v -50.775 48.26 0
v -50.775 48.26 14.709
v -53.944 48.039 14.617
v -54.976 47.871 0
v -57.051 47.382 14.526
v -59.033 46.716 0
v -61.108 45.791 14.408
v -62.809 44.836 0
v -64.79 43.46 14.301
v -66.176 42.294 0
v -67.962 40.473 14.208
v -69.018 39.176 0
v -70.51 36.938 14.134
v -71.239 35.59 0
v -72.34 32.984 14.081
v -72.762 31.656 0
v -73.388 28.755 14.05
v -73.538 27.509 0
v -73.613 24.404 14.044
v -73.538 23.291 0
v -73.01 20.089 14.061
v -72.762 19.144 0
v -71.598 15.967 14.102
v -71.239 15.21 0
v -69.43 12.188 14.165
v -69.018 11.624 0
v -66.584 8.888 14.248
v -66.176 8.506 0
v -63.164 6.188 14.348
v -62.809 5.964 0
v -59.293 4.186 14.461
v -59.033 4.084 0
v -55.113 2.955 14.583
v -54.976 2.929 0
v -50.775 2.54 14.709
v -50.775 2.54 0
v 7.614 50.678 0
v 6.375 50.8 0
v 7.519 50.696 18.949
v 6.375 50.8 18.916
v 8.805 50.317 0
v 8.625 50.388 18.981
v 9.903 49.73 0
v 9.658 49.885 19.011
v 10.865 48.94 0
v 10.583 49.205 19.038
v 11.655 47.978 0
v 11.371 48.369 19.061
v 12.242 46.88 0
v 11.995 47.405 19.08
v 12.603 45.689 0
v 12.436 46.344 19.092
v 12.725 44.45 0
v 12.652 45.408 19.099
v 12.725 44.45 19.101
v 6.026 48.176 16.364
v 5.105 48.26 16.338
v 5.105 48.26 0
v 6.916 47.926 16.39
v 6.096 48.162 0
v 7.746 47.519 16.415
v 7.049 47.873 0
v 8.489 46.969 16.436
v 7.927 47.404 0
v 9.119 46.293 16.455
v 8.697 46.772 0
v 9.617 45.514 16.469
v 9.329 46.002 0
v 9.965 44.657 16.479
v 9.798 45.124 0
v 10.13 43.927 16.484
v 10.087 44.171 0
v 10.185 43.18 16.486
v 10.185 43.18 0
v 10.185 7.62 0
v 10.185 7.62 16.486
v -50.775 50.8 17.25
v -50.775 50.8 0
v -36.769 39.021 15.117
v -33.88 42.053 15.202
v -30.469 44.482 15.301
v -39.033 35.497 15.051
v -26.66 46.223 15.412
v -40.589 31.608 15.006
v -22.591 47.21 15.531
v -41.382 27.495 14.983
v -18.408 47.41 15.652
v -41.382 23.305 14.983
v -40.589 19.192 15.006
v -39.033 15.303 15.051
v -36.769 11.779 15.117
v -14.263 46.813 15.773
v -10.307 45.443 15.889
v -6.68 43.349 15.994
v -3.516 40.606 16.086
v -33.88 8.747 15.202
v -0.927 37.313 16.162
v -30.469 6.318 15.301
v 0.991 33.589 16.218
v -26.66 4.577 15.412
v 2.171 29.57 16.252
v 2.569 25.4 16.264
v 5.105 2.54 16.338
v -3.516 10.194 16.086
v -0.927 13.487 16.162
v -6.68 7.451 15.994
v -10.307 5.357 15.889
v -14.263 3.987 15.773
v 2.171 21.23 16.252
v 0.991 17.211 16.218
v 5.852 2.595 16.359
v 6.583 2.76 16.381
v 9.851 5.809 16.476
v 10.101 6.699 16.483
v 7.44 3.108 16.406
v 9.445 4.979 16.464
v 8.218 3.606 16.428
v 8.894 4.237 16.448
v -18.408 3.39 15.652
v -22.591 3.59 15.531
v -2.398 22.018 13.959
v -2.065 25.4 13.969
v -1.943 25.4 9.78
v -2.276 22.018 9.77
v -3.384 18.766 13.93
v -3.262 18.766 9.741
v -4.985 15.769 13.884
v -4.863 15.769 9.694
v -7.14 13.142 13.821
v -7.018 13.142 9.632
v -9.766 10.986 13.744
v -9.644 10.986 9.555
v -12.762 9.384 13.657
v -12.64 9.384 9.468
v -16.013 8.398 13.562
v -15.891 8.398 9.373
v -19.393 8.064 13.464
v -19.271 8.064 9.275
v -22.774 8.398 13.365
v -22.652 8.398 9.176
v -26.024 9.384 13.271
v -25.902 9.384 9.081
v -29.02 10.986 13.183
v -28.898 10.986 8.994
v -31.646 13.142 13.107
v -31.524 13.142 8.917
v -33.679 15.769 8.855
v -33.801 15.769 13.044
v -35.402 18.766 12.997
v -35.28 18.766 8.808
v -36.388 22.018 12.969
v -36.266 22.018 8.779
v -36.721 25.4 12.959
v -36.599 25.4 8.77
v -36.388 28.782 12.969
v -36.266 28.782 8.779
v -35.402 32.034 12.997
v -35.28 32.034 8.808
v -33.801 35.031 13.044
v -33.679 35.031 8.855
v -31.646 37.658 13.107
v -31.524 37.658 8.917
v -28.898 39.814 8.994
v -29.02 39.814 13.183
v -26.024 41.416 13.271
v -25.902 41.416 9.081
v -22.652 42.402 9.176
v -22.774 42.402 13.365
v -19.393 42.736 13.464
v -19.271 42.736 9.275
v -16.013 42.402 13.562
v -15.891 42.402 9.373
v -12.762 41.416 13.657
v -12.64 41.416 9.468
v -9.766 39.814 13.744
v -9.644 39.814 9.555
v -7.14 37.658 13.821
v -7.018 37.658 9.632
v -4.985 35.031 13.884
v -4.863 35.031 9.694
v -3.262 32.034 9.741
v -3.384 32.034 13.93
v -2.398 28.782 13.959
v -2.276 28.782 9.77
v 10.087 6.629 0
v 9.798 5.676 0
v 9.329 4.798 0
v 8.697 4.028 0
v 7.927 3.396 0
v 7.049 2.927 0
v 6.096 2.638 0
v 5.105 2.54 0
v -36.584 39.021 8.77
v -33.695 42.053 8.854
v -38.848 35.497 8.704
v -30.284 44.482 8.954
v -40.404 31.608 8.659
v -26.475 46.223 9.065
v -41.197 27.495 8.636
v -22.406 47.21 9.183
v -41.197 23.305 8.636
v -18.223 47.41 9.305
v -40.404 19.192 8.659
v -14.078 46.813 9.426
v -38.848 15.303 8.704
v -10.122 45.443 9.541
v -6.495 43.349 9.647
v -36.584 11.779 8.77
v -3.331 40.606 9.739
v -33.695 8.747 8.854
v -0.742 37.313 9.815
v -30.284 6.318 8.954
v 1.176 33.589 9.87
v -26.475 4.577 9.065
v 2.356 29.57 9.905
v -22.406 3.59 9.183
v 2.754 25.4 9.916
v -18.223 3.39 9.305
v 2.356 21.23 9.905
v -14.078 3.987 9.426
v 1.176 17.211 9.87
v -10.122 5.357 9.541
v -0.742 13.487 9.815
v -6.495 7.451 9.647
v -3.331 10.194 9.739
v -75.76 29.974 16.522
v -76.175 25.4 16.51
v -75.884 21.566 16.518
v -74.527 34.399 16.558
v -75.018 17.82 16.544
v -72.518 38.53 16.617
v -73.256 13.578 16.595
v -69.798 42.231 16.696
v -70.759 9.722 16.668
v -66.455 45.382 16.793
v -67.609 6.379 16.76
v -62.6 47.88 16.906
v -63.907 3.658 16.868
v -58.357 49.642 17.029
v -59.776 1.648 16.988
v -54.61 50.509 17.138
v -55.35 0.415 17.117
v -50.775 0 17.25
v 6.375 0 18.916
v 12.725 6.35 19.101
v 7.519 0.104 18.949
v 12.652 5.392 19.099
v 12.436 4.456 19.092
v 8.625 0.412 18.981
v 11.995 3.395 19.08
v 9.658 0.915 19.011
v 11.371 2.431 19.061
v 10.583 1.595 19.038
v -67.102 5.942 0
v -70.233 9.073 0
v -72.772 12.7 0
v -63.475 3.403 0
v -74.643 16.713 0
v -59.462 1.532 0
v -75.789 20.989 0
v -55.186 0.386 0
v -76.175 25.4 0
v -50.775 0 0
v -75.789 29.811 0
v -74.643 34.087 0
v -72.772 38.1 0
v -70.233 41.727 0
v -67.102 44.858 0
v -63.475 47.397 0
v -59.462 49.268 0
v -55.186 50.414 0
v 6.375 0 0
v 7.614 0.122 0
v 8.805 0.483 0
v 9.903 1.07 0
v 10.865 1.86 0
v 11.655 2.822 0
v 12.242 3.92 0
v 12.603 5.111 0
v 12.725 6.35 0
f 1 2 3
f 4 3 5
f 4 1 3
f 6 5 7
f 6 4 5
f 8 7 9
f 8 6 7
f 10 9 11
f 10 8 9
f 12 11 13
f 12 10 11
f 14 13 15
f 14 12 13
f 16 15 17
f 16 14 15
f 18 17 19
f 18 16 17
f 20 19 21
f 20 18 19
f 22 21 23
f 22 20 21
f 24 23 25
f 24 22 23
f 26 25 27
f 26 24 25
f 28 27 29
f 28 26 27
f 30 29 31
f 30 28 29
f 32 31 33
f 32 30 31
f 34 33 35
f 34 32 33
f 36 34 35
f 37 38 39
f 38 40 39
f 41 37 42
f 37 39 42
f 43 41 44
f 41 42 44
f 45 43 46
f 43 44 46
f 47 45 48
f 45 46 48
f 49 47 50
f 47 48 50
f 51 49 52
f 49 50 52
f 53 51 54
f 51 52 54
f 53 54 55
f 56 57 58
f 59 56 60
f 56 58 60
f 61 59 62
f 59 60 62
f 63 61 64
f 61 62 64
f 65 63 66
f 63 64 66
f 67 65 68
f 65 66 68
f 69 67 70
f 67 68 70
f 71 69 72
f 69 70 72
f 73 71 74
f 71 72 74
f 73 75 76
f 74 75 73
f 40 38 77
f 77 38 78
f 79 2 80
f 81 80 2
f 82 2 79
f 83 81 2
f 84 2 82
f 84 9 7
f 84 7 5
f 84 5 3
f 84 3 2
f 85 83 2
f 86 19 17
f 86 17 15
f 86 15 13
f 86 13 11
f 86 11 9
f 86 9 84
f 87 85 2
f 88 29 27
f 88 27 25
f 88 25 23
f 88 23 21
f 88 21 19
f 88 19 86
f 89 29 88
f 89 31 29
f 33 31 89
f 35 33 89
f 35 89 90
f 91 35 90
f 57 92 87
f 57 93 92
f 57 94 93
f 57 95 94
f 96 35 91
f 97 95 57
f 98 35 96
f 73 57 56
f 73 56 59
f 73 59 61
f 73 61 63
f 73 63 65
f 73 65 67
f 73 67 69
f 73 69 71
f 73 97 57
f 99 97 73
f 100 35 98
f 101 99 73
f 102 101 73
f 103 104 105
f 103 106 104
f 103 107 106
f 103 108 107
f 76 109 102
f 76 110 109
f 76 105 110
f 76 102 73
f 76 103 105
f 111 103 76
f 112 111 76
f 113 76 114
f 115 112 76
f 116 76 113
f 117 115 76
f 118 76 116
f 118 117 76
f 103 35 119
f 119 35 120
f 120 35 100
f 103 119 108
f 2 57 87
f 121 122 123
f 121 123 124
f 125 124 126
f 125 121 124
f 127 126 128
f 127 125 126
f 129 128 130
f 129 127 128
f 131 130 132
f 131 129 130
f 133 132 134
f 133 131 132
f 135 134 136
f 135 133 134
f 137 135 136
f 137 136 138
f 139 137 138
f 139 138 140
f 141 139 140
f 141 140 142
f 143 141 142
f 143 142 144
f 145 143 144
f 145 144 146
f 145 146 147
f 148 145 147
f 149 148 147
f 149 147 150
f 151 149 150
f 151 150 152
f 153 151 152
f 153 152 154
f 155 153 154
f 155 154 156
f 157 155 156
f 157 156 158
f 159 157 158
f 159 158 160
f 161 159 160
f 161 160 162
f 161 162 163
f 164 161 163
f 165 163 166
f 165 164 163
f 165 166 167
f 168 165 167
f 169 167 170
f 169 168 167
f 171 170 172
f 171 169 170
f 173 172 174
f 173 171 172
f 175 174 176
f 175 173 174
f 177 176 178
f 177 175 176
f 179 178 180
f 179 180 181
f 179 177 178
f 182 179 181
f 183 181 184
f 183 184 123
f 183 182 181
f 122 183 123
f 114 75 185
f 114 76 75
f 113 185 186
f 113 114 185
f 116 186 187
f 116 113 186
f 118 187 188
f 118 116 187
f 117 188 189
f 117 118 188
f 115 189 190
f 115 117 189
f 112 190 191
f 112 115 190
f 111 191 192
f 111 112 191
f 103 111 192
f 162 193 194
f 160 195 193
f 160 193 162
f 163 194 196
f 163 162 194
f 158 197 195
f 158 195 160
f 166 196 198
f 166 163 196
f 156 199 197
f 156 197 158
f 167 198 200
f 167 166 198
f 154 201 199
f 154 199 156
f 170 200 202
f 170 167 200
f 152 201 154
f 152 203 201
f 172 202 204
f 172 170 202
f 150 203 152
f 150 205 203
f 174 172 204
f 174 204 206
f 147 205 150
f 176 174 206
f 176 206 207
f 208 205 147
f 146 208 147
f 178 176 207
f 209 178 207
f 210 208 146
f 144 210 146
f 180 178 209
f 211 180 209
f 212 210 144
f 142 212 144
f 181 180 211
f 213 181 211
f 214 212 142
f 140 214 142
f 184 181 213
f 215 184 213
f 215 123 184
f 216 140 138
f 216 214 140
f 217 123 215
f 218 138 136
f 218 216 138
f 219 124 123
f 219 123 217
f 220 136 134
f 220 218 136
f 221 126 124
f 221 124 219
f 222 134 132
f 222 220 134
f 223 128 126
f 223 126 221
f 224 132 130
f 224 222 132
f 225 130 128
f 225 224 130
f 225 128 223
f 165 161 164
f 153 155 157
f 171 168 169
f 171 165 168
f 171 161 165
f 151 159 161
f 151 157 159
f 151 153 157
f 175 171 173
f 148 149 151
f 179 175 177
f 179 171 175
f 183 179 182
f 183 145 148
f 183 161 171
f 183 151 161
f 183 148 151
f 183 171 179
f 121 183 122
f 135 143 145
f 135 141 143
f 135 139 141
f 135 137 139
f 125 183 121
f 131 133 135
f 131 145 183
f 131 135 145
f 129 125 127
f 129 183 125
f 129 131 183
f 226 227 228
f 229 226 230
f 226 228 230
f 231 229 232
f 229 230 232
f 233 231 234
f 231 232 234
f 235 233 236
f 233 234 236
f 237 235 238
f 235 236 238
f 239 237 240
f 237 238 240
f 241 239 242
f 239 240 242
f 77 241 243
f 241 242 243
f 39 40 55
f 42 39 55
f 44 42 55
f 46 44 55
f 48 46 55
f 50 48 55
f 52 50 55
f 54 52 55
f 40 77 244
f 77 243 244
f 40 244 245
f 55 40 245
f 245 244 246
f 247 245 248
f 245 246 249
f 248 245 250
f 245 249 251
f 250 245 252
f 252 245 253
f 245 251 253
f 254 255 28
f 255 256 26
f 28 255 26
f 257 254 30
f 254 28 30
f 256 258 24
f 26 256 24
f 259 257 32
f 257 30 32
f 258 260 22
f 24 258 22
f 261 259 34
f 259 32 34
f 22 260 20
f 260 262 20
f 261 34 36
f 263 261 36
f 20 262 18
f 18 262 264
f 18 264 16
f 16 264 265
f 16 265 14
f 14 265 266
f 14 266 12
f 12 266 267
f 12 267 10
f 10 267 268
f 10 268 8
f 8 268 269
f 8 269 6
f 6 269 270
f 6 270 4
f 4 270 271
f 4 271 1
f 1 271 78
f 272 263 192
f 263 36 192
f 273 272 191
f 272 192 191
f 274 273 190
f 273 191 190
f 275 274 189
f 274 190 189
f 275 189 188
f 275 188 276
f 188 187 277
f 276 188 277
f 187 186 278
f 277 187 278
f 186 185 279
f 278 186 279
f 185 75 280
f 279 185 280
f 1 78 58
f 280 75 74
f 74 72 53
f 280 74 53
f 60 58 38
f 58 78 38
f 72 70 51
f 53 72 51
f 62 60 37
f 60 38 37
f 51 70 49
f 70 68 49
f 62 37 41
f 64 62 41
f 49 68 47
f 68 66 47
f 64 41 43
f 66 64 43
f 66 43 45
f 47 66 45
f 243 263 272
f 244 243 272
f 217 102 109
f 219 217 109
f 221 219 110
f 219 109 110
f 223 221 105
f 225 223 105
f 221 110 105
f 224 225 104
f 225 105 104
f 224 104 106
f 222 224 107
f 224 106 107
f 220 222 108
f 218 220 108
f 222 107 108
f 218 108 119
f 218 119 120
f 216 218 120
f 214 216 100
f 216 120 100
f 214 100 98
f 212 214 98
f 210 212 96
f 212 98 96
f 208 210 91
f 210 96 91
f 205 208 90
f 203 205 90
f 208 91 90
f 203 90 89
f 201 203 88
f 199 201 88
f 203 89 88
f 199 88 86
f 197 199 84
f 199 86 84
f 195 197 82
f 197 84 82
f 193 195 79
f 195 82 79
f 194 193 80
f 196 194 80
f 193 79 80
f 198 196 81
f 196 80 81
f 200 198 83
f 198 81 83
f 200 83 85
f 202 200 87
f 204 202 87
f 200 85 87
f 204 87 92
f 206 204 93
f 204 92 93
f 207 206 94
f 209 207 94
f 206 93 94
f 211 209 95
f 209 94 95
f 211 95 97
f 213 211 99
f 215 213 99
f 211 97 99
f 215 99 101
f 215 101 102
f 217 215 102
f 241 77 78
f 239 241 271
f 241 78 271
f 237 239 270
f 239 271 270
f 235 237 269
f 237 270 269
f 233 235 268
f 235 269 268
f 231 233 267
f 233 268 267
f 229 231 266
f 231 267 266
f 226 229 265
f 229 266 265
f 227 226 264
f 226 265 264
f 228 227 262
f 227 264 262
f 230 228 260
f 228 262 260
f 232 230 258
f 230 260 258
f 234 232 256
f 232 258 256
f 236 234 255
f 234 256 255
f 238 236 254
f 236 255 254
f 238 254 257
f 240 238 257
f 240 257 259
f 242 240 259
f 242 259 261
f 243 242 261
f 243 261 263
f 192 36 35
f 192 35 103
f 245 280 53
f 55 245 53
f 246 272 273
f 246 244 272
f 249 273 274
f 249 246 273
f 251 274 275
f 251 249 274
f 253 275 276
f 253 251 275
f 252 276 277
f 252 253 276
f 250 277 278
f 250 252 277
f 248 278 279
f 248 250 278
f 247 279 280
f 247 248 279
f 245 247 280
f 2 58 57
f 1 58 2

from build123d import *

# Parameters (mm, degrees)
F1_DEPTH = 19.1008
F3_DEPTH = 76.2
F4_T     = -2.54
F5_R     = 22.0345
F6_DEPTH = 6.35
F7_R     = 6.35
F8_T     = -4.699
F9_R     = 5.08


with BuildPart() as f1:
    # F0 (on Top) → F1 (new body)
    with BuildSketch(Plane.XY):
        with BuildLine():
            ThreePointArc((-50.7750985182, 50.8), (-76.1750985182, 25.4), (-50.7750985182, 0))
            Line((-50.7750985182, 0), (12.7249014818, 0))
            Line((12.7249014818, 0), (12.7249014818, 50.8))
            Line((12.7249014818, 50.8), (-50.7750985182, 50.8))
        make_face()
    extrude(amount=F1_DEPTH)

    # F2 (on face) → F3 (cut)
    with BuildSketch(Plane.XZ):
        Polygon((-76.1750985182, 16.51), (12.7249014818, 19.1008), (-76.1750985182, 19.1008), align=None)
    extrude(amount=-F3_DEPTH, mode=Mode.SUBTRACT)

    # F4
    f4_openings = [f1.faces().sort_by_distance(p)[0] for p in [
        (-29.192225, 25.4, 0),
    ]]
    offset(amount=F4_T, openings=f4_openings, kind=Kind.INTERSECTION)

    # F5 (on face) → F6 (join)
    with BuildSketch(Plane(origin=(-0.4713899101, 0, 16.1751439753), x_dir=(0.9995756172, 0, 0.0291304894), z_dir=(0.0291304894, 0, -0.9995756172))):
        with Locations((-18.9927711198, -25.4)):
            Circle(F5_R)
    extrude(amount=F6_DEPTH)

    # F7
    f7_edges = [f1.edges().sort_by_distance(p)[0] for p in [
        (12.724901, 50.8, 9.5504),
        (12.724901, 0, 9.5504),
    ]]
    fillet(f7_edges, radius=F7_R)

    # F8
    f8_openings = [f1.faces().sort_by_distance(p)[0] for p in [
        (-19.271122, 25.4, 9.27457),
    ]]
    offset(amount=F8_T, openings=f8_openings)

    # F9
    f9_edges = [f1.edges().sort_by_distance(p)[0] for p in [
        (10.184901, 2.54, 8.242849),
        (10.184901, 48.26, 8.242849),
    ]]
    fillet(f9_edges, radius=F9_R)


solid = f1.part
